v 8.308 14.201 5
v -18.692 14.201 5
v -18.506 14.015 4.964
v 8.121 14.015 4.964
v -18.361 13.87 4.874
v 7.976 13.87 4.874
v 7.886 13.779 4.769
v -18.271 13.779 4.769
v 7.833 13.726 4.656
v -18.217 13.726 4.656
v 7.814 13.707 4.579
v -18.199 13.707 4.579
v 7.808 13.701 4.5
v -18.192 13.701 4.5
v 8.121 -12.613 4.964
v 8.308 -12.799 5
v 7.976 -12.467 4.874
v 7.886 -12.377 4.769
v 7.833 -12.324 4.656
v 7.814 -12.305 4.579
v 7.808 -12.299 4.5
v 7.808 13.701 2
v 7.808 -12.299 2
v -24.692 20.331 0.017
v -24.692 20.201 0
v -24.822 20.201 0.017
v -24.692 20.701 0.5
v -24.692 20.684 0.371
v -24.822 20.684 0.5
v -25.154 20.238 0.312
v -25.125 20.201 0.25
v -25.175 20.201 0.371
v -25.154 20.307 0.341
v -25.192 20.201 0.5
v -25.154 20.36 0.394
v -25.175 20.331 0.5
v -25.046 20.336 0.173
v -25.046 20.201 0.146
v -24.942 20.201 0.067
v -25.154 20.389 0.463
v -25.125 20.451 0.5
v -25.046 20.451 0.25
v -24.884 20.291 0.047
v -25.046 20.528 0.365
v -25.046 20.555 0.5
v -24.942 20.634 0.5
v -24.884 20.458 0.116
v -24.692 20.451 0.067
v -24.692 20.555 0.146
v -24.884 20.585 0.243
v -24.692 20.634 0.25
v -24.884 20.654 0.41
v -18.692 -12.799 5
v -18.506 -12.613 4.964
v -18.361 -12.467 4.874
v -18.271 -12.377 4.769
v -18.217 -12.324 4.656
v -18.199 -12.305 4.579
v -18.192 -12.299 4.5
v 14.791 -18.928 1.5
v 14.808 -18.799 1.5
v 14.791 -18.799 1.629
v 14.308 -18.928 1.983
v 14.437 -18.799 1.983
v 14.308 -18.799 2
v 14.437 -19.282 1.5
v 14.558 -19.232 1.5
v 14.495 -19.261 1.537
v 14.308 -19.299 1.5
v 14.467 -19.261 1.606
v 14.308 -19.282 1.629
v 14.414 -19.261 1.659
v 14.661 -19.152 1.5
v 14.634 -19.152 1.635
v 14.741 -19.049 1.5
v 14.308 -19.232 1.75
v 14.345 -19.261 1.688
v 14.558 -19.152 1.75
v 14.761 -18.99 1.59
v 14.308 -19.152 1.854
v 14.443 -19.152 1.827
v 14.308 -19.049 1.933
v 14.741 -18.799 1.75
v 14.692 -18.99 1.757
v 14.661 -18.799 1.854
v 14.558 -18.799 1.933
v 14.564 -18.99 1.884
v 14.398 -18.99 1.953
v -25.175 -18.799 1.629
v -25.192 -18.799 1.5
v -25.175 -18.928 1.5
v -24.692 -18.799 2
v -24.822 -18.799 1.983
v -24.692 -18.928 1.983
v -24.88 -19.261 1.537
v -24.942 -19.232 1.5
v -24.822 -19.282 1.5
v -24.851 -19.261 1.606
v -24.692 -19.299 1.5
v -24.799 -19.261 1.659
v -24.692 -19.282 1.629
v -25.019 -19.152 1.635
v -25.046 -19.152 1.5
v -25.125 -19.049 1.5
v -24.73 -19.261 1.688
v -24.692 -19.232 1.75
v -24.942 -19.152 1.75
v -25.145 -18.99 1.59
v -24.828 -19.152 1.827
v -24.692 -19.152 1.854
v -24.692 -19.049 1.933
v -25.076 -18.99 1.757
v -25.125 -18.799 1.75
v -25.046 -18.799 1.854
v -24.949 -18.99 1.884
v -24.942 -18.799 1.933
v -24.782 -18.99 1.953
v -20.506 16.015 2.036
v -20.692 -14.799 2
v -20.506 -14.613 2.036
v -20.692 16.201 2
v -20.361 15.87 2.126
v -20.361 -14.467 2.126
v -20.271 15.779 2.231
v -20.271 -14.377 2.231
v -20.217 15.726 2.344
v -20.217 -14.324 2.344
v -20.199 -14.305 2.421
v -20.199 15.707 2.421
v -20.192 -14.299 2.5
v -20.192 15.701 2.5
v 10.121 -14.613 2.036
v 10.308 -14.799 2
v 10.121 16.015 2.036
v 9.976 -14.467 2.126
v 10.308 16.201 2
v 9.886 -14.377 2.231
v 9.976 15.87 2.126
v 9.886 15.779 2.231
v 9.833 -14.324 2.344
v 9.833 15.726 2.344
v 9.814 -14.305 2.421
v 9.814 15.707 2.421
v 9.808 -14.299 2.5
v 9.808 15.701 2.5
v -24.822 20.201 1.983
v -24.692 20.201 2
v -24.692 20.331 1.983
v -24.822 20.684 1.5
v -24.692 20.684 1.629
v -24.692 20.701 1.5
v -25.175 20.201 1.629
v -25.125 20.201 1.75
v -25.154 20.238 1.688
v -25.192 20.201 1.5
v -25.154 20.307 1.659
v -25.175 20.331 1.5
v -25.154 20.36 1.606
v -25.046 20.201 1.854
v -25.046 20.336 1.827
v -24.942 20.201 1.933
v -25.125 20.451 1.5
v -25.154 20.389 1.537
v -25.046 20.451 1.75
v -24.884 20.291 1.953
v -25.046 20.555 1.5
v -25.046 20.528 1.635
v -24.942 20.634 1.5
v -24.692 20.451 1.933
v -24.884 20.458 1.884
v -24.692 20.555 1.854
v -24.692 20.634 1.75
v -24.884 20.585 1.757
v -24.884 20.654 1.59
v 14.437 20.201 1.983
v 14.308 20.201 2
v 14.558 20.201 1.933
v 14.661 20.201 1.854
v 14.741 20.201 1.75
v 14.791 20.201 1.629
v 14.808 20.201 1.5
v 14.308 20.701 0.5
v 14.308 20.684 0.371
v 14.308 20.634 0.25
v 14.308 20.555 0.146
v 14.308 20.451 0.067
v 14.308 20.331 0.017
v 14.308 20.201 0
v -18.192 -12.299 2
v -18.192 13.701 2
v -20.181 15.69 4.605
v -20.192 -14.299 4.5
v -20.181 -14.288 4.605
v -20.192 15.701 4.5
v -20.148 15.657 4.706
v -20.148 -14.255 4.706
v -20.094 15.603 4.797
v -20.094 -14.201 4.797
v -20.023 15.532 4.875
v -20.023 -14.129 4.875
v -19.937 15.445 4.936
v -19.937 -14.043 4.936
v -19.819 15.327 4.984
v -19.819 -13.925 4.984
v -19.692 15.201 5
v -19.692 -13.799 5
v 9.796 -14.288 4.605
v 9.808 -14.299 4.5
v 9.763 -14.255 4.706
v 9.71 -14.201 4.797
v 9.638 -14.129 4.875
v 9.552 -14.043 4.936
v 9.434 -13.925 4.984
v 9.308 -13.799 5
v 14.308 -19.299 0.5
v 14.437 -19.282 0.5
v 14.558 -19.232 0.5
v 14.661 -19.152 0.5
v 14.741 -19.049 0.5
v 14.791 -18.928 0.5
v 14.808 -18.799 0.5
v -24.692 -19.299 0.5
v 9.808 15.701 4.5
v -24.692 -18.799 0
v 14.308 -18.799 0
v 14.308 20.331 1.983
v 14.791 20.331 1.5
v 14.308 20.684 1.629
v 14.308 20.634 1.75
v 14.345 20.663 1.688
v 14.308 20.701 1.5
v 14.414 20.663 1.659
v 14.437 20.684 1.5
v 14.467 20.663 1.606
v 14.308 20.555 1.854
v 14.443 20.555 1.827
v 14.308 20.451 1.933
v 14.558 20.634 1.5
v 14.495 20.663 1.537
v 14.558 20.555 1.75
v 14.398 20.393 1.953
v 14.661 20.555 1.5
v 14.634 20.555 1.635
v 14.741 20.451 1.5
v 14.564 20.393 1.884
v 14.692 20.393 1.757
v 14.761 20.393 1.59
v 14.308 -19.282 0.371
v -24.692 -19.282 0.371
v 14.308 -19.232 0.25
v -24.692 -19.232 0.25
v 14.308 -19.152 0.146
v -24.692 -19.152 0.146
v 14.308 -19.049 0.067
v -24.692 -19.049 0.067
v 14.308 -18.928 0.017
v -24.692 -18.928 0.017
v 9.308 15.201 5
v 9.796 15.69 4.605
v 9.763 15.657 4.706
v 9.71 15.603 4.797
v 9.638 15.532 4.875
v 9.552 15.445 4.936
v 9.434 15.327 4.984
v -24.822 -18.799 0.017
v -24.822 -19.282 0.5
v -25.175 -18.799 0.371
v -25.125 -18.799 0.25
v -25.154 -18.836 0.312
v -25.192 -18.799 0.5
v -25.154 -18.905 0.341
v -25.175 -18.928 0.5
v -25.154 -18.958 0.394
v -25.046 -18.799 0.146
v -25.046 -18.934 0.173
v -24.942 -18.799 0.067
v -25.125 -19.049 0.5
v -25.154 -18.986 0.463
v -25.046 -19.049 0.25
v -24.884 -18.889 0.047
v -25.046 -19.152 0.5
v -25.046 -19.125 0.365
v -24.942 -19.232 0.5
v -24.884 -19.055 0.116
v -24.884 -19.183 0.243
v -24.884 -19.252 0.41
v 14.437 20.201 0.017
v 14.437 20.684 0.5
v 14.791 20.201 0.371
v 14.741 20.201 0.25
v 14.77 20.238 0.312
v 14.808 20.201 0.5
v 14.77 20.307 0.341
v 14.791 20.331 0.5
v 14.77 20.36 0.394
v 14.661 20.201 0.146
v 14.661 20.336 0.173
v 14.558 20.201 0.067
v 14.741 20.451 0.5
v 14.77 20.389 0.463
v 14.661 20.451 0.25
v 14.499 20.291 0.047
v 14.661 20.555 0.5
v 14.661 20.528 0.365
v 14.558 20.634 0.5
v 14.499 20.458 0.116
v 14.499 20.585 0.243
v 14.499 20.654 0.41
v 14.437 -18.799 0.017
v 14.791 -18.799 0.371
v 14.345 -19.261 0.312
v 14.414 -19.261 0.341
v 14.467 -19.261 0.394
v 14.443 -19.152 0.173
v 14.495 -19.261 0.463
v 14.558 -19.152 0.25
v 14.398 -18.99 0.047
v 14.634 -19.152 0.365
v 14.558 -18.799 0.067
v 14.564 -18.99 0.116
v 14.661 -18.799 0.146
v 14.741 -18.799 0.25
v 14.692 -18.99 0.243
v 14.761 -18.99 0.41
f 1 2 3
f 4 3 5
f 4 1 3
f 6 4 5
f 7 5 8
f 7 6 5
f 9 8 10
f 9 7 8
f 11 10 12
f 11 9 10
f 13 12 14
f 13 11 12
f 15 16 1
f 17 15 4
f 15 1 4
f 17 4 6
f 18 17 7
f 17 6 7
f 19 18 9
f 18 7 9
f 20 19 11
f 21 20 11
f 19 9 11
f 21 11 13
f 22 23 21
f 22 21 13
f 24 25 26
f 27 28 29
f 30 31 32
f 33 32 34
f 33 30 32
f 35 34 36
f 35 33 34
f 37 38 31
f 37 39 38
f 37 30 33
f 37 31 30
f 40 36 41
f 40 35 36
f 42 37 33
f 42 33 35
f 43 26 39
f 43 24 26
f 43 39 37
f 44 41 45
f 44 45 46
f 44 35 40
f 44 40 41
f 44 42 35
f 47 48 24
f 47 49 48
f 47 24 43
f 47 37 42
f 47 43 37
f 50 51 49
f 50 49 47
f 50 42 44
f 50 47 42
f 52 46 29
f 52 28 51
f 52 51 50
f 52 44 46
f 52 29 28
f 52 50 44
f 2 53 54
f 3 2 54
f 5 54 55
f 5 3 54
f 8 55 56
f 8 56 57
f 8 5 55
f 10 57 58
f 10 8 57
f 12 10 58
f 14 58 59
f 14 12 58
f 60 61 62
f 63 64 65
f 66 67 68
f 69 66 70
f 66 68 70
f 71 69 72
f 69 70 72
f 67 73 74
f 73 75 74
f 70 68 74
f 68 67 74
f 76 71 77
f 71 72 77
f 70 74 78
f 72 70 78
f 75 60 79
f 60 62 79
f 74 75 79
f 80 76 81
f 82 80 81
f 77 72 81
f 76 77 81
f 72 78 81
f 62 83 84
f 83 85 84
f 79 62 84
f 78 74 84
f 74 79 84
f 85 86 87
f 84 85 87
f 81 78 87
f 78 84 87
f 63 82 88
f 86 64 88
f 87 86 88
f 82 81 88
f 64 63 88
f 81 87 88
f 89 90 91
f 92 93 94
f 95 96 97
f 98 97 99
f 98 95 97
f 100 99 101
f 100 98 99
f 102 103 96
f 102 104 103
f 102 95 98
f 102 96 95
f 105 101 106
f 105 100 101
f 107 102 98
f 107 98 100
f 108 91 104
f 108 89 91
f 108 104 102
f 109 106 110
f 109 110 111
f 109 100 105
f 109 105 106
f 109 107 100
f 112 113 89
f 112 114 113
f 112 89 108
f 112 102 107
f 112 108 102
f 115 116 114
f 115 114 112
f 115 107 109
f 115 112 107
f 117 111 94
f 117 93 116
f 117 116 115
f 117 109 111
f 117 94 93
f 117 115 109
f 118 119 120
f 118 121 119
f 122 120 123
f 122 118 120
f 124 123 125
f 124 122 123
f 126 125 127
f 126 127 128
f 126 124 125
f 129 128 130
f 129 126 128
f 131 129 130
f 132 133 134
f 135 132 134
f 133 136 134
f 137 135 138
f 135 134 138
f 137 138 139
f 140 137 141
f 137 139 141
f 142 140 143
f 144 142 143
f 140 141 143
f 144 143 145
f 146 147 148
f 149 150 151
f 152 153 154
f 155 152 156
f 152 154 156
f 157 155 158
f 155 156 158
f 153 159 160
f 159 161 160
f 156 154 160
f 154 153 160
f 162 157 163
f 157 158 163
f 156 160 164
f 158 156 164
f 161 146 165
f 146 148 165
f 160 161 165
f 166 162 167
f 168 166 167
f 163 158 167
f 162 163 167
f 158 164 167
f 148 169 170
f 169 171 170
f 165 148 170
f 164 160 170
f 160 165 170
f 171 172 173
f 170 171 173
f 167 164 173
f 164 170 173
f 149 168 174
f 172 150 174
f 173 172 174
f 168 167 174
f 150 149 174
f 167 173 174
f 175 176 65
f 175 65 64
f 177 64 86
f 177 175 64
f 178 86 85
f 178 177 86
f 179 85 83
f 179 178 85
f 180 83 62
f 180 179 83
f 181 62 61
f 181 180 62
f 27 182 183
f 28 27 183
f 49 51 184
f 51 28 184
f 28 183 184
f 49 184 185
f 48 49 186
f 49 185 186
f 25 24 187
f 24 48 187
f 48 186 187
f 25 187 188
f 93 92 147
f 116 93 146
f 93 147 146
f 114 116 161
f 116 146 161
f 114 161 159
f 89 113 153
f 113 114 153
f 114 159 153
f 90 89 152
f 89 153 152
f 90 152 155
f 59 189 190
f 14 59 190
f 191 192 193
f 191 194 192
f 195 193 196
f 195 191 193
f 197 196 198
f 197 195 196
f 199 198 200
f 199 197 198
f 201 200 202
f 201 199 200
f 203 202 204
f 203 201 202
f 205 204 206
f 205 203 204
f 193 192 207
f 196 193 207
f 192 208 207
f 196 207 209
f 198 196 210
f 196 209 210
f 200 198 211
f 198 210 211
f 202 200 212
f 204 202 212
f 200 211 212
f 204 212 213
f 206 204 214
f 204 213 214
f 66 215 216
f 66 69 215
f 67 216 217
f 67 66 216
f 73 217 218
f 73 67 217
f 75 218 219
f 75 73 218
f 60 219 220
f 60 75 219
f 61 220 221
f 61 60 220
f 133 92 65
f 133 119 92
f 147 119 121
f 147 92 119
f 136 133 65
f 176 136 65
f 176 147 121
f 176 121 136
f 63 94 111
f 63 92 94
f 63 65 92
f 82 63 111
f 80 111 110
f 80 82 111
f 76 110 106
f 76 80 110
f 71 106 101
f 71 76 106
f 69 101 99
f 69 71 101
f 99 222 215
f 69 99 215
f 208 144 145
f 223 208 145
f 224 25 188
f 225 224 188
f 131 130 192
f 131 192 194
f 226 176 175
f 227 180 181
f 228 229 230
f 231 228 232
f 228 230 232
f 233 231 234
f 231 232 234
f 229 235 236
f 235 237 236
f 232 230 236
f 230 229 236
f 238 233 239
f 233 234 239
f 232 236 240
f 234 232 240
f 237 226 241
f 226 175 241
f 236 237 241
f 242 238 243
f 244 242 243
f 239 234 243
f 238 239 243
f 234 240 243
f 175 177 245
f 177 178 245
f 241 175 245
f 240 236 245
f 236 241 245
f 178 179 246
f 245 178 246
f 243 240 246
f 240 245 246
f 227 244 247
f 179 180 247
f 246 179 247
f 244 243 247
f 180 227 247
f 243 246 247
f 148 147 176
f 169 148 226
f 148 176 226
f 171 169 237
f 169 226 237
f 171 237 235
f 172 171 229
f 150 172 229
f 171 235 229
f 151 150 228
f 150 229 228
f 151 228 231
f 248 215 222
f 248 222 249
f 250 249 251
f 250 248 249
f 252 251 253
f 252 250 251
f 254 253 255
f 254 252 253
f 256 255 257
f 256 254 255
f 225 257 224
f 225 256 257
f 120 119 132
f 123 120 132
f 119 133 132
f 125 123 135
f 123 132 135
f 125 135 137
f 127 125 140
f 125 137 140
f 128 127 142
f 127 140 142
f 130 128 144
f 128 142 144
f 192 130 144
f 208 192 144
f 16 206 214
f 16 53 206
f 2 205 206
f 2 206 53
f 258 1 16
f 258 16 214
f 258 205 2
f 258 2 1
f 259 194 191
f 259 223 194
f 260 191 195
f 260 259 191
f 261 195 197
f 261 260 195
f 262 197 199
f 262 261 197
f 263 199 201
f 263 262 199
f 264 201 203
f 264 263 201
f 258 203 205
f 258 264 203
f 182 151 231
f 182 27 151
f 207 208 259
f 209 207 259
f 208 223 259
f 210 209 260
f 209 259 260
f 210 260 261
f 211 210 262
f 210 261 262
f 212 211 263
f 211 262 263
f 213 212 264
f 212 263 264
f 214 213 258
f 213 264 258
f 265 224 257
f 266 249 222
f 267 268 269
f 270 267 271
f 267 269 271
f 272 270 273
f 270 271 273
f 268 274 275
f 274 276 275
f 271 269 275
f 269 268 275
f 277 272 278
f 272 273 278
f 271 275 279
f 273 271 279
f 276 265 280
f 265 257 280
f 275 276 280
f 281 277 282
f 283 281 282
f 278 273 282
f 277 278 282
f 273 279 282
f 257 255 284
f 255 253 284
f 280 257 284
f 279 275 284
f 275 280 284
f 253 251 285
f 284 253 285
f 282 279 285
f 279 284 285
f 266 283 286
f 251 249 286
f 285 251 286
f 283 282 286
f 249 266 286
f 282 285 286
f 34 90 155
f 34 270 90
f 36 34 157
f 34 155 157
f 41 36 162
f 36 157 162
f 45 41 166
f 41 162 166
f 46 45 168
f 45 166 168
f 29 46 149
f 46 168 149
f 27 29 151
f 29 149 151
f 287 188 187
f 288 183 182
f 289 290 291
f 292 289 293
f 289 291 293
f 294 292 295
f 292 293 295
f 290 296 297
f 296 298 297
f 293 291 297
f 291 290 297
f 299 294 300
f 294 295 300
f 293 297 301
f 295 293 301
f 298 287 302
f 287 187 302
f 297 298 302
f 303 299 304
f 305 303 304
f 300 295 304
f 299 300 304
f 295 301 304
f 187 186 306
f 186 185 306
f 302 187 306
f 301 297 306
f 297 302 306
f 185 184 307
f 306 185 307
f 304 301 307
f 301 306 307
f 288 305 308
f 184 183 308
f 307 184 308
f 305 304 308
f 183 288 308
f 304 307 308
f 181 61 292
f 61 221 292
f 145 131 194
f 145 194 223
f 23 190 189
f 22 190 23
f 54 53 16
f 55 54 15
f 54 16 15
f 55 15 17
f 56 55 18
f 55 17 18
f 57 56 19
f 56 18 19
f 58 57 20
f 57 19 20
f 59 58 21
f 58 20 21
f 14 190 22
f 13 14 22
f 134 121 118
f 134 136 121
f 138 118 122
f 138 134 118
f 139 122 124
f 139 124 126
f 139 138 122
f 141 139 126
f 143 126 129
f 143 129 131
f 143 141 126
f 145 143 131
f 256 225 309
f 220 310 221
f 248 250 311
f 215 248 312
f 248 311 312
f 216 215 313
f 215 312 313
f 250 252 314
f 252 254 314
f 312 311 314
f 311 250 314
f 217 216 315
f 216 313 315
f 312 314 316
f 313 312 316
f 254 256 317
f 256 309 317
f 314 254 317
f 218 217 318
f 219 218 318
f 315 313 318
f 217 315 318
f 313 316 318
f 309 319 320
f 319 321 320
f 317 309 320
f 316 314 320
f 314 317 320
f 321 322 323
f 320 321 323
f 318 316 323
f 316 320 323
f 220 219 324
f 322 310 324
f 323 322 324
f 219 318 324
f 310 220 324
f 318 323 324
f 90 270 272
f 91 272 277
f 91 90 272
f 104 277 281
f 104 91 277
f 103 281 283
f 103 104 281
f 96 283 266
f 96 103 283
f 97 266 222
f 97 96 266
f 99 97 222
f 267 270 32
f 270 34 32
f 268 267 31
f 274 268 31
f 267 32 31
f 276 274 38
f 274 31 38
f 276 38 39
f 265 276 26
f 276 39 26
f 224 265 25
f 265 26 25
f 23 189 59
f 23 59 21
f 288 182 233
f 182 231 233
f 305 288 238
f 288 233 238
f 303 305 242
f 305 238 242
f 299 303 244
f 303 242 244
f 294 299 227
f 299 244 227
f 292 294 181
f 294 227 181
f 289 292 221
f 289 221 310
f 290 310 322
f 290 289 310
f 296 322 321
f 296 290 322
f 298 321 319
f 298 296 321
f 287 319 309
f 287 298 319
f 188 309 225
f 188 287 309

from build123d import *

# Parameters (mm, degrees)
SKETCH1_W           = 40
SKETCH1_H           = 40
BOSS_EXTRUDE1_DEPTH = 2
SKETCH2_W           = 30
SKETCH2_H           = 30
SKETCH2_W_2         = 26
SKETCH2_H_2         = 26
BOSS_EXTRUDE2_DEPTH = 3
FILLET1_R           = 0.5
FILLET2_R           = 0.5
FILLET3_R           = 0.5


with BuildPart() as part:
    # Sketch1 → Boss-Extrude1 (new body)
    with BuildSketch(Plane.XY):
        with Locations((-5.192307692, 0.701169798)):
            Rectangle(SKETCH1_W, SKETCH1_H)
    extrude(amount=BOSS_EXTRUDE1_DEPTH)

    # Sketch2 → Boss-Extrude2 (add)
    with BuildSketch(Plane.XY.offset(2)):
        with Locations((-5.192307692, 0.701169798)):
            Rectangle(SKETCH2_W, SKETCH2_H)
        with Locations((-5.192307692, 0.701169798)):
            Rectangle(SKETCH2_W_2, SKETCH2_H_2, mode=Mode.SUBTRACT)
    extrude(amount=BOSS_EXTRUDE2_DEPTH)

    # Fillet1
    fillet1_edges = [part.edges().sort_by_distance(p)[0] for p in [
        (-20.192307692, 0.701169798, 5),
        (-5.192307692, -14.298830202, 5),
        (9.807692308, 0.701169798, 5),
        (-5.192307692, 15.701169798, 5),
        (-18.192307692, 0.701169798, 5),
        (-5.192307692, -12.298830202, 5),
        (7.807692308, 0.701169798, 5),
        (-5.192307692, 13.701169798, 5),
    ]]
    fillet(fillet1_edges, radius=FILLET1_R)

    # Fillet2
    fillet2_edges = [part.edges().sort_by_distance(p)[0] for p in [
        (14.807692308, 0.701169798, 2),
        (-5.192307692, 20.701169798, 2),
        (-25.192307692, 0.701169798, 2),
        (-5.192307692, 20.701169798, 0),
        (14.807692308, 0.701169798, 0),
        (-5.192307692, -19.298830202, 0),
        (-25.192307692, 0.701169798, 0),
        (-25.192307692, 20.701169798, 1),
        (14.807692308, 20.701169798, 1),
        (14.807692308, -19.298830202, 1),
        (-25.192307692, -19.298830202, 1),
        (-5.192307692, -19.298830202, 2),
    ]]
    fillet(fillet2_edges, radius=FILLET2_R)

    # Fillet3
    fillet3_edges = [part.edges().sort_by_distance(p)[0] for p in [
        (-20.192307692, 0.701169798, 2),
        (-5.192307692, -14.298830202, 2),
        (9.807692308, 0.701169798, 2),
        (-5.192307692, 15.701169798, 2),
    ]]
    fillet(fillet3_edges, radius=FILLET3_R)


solid = part.part
